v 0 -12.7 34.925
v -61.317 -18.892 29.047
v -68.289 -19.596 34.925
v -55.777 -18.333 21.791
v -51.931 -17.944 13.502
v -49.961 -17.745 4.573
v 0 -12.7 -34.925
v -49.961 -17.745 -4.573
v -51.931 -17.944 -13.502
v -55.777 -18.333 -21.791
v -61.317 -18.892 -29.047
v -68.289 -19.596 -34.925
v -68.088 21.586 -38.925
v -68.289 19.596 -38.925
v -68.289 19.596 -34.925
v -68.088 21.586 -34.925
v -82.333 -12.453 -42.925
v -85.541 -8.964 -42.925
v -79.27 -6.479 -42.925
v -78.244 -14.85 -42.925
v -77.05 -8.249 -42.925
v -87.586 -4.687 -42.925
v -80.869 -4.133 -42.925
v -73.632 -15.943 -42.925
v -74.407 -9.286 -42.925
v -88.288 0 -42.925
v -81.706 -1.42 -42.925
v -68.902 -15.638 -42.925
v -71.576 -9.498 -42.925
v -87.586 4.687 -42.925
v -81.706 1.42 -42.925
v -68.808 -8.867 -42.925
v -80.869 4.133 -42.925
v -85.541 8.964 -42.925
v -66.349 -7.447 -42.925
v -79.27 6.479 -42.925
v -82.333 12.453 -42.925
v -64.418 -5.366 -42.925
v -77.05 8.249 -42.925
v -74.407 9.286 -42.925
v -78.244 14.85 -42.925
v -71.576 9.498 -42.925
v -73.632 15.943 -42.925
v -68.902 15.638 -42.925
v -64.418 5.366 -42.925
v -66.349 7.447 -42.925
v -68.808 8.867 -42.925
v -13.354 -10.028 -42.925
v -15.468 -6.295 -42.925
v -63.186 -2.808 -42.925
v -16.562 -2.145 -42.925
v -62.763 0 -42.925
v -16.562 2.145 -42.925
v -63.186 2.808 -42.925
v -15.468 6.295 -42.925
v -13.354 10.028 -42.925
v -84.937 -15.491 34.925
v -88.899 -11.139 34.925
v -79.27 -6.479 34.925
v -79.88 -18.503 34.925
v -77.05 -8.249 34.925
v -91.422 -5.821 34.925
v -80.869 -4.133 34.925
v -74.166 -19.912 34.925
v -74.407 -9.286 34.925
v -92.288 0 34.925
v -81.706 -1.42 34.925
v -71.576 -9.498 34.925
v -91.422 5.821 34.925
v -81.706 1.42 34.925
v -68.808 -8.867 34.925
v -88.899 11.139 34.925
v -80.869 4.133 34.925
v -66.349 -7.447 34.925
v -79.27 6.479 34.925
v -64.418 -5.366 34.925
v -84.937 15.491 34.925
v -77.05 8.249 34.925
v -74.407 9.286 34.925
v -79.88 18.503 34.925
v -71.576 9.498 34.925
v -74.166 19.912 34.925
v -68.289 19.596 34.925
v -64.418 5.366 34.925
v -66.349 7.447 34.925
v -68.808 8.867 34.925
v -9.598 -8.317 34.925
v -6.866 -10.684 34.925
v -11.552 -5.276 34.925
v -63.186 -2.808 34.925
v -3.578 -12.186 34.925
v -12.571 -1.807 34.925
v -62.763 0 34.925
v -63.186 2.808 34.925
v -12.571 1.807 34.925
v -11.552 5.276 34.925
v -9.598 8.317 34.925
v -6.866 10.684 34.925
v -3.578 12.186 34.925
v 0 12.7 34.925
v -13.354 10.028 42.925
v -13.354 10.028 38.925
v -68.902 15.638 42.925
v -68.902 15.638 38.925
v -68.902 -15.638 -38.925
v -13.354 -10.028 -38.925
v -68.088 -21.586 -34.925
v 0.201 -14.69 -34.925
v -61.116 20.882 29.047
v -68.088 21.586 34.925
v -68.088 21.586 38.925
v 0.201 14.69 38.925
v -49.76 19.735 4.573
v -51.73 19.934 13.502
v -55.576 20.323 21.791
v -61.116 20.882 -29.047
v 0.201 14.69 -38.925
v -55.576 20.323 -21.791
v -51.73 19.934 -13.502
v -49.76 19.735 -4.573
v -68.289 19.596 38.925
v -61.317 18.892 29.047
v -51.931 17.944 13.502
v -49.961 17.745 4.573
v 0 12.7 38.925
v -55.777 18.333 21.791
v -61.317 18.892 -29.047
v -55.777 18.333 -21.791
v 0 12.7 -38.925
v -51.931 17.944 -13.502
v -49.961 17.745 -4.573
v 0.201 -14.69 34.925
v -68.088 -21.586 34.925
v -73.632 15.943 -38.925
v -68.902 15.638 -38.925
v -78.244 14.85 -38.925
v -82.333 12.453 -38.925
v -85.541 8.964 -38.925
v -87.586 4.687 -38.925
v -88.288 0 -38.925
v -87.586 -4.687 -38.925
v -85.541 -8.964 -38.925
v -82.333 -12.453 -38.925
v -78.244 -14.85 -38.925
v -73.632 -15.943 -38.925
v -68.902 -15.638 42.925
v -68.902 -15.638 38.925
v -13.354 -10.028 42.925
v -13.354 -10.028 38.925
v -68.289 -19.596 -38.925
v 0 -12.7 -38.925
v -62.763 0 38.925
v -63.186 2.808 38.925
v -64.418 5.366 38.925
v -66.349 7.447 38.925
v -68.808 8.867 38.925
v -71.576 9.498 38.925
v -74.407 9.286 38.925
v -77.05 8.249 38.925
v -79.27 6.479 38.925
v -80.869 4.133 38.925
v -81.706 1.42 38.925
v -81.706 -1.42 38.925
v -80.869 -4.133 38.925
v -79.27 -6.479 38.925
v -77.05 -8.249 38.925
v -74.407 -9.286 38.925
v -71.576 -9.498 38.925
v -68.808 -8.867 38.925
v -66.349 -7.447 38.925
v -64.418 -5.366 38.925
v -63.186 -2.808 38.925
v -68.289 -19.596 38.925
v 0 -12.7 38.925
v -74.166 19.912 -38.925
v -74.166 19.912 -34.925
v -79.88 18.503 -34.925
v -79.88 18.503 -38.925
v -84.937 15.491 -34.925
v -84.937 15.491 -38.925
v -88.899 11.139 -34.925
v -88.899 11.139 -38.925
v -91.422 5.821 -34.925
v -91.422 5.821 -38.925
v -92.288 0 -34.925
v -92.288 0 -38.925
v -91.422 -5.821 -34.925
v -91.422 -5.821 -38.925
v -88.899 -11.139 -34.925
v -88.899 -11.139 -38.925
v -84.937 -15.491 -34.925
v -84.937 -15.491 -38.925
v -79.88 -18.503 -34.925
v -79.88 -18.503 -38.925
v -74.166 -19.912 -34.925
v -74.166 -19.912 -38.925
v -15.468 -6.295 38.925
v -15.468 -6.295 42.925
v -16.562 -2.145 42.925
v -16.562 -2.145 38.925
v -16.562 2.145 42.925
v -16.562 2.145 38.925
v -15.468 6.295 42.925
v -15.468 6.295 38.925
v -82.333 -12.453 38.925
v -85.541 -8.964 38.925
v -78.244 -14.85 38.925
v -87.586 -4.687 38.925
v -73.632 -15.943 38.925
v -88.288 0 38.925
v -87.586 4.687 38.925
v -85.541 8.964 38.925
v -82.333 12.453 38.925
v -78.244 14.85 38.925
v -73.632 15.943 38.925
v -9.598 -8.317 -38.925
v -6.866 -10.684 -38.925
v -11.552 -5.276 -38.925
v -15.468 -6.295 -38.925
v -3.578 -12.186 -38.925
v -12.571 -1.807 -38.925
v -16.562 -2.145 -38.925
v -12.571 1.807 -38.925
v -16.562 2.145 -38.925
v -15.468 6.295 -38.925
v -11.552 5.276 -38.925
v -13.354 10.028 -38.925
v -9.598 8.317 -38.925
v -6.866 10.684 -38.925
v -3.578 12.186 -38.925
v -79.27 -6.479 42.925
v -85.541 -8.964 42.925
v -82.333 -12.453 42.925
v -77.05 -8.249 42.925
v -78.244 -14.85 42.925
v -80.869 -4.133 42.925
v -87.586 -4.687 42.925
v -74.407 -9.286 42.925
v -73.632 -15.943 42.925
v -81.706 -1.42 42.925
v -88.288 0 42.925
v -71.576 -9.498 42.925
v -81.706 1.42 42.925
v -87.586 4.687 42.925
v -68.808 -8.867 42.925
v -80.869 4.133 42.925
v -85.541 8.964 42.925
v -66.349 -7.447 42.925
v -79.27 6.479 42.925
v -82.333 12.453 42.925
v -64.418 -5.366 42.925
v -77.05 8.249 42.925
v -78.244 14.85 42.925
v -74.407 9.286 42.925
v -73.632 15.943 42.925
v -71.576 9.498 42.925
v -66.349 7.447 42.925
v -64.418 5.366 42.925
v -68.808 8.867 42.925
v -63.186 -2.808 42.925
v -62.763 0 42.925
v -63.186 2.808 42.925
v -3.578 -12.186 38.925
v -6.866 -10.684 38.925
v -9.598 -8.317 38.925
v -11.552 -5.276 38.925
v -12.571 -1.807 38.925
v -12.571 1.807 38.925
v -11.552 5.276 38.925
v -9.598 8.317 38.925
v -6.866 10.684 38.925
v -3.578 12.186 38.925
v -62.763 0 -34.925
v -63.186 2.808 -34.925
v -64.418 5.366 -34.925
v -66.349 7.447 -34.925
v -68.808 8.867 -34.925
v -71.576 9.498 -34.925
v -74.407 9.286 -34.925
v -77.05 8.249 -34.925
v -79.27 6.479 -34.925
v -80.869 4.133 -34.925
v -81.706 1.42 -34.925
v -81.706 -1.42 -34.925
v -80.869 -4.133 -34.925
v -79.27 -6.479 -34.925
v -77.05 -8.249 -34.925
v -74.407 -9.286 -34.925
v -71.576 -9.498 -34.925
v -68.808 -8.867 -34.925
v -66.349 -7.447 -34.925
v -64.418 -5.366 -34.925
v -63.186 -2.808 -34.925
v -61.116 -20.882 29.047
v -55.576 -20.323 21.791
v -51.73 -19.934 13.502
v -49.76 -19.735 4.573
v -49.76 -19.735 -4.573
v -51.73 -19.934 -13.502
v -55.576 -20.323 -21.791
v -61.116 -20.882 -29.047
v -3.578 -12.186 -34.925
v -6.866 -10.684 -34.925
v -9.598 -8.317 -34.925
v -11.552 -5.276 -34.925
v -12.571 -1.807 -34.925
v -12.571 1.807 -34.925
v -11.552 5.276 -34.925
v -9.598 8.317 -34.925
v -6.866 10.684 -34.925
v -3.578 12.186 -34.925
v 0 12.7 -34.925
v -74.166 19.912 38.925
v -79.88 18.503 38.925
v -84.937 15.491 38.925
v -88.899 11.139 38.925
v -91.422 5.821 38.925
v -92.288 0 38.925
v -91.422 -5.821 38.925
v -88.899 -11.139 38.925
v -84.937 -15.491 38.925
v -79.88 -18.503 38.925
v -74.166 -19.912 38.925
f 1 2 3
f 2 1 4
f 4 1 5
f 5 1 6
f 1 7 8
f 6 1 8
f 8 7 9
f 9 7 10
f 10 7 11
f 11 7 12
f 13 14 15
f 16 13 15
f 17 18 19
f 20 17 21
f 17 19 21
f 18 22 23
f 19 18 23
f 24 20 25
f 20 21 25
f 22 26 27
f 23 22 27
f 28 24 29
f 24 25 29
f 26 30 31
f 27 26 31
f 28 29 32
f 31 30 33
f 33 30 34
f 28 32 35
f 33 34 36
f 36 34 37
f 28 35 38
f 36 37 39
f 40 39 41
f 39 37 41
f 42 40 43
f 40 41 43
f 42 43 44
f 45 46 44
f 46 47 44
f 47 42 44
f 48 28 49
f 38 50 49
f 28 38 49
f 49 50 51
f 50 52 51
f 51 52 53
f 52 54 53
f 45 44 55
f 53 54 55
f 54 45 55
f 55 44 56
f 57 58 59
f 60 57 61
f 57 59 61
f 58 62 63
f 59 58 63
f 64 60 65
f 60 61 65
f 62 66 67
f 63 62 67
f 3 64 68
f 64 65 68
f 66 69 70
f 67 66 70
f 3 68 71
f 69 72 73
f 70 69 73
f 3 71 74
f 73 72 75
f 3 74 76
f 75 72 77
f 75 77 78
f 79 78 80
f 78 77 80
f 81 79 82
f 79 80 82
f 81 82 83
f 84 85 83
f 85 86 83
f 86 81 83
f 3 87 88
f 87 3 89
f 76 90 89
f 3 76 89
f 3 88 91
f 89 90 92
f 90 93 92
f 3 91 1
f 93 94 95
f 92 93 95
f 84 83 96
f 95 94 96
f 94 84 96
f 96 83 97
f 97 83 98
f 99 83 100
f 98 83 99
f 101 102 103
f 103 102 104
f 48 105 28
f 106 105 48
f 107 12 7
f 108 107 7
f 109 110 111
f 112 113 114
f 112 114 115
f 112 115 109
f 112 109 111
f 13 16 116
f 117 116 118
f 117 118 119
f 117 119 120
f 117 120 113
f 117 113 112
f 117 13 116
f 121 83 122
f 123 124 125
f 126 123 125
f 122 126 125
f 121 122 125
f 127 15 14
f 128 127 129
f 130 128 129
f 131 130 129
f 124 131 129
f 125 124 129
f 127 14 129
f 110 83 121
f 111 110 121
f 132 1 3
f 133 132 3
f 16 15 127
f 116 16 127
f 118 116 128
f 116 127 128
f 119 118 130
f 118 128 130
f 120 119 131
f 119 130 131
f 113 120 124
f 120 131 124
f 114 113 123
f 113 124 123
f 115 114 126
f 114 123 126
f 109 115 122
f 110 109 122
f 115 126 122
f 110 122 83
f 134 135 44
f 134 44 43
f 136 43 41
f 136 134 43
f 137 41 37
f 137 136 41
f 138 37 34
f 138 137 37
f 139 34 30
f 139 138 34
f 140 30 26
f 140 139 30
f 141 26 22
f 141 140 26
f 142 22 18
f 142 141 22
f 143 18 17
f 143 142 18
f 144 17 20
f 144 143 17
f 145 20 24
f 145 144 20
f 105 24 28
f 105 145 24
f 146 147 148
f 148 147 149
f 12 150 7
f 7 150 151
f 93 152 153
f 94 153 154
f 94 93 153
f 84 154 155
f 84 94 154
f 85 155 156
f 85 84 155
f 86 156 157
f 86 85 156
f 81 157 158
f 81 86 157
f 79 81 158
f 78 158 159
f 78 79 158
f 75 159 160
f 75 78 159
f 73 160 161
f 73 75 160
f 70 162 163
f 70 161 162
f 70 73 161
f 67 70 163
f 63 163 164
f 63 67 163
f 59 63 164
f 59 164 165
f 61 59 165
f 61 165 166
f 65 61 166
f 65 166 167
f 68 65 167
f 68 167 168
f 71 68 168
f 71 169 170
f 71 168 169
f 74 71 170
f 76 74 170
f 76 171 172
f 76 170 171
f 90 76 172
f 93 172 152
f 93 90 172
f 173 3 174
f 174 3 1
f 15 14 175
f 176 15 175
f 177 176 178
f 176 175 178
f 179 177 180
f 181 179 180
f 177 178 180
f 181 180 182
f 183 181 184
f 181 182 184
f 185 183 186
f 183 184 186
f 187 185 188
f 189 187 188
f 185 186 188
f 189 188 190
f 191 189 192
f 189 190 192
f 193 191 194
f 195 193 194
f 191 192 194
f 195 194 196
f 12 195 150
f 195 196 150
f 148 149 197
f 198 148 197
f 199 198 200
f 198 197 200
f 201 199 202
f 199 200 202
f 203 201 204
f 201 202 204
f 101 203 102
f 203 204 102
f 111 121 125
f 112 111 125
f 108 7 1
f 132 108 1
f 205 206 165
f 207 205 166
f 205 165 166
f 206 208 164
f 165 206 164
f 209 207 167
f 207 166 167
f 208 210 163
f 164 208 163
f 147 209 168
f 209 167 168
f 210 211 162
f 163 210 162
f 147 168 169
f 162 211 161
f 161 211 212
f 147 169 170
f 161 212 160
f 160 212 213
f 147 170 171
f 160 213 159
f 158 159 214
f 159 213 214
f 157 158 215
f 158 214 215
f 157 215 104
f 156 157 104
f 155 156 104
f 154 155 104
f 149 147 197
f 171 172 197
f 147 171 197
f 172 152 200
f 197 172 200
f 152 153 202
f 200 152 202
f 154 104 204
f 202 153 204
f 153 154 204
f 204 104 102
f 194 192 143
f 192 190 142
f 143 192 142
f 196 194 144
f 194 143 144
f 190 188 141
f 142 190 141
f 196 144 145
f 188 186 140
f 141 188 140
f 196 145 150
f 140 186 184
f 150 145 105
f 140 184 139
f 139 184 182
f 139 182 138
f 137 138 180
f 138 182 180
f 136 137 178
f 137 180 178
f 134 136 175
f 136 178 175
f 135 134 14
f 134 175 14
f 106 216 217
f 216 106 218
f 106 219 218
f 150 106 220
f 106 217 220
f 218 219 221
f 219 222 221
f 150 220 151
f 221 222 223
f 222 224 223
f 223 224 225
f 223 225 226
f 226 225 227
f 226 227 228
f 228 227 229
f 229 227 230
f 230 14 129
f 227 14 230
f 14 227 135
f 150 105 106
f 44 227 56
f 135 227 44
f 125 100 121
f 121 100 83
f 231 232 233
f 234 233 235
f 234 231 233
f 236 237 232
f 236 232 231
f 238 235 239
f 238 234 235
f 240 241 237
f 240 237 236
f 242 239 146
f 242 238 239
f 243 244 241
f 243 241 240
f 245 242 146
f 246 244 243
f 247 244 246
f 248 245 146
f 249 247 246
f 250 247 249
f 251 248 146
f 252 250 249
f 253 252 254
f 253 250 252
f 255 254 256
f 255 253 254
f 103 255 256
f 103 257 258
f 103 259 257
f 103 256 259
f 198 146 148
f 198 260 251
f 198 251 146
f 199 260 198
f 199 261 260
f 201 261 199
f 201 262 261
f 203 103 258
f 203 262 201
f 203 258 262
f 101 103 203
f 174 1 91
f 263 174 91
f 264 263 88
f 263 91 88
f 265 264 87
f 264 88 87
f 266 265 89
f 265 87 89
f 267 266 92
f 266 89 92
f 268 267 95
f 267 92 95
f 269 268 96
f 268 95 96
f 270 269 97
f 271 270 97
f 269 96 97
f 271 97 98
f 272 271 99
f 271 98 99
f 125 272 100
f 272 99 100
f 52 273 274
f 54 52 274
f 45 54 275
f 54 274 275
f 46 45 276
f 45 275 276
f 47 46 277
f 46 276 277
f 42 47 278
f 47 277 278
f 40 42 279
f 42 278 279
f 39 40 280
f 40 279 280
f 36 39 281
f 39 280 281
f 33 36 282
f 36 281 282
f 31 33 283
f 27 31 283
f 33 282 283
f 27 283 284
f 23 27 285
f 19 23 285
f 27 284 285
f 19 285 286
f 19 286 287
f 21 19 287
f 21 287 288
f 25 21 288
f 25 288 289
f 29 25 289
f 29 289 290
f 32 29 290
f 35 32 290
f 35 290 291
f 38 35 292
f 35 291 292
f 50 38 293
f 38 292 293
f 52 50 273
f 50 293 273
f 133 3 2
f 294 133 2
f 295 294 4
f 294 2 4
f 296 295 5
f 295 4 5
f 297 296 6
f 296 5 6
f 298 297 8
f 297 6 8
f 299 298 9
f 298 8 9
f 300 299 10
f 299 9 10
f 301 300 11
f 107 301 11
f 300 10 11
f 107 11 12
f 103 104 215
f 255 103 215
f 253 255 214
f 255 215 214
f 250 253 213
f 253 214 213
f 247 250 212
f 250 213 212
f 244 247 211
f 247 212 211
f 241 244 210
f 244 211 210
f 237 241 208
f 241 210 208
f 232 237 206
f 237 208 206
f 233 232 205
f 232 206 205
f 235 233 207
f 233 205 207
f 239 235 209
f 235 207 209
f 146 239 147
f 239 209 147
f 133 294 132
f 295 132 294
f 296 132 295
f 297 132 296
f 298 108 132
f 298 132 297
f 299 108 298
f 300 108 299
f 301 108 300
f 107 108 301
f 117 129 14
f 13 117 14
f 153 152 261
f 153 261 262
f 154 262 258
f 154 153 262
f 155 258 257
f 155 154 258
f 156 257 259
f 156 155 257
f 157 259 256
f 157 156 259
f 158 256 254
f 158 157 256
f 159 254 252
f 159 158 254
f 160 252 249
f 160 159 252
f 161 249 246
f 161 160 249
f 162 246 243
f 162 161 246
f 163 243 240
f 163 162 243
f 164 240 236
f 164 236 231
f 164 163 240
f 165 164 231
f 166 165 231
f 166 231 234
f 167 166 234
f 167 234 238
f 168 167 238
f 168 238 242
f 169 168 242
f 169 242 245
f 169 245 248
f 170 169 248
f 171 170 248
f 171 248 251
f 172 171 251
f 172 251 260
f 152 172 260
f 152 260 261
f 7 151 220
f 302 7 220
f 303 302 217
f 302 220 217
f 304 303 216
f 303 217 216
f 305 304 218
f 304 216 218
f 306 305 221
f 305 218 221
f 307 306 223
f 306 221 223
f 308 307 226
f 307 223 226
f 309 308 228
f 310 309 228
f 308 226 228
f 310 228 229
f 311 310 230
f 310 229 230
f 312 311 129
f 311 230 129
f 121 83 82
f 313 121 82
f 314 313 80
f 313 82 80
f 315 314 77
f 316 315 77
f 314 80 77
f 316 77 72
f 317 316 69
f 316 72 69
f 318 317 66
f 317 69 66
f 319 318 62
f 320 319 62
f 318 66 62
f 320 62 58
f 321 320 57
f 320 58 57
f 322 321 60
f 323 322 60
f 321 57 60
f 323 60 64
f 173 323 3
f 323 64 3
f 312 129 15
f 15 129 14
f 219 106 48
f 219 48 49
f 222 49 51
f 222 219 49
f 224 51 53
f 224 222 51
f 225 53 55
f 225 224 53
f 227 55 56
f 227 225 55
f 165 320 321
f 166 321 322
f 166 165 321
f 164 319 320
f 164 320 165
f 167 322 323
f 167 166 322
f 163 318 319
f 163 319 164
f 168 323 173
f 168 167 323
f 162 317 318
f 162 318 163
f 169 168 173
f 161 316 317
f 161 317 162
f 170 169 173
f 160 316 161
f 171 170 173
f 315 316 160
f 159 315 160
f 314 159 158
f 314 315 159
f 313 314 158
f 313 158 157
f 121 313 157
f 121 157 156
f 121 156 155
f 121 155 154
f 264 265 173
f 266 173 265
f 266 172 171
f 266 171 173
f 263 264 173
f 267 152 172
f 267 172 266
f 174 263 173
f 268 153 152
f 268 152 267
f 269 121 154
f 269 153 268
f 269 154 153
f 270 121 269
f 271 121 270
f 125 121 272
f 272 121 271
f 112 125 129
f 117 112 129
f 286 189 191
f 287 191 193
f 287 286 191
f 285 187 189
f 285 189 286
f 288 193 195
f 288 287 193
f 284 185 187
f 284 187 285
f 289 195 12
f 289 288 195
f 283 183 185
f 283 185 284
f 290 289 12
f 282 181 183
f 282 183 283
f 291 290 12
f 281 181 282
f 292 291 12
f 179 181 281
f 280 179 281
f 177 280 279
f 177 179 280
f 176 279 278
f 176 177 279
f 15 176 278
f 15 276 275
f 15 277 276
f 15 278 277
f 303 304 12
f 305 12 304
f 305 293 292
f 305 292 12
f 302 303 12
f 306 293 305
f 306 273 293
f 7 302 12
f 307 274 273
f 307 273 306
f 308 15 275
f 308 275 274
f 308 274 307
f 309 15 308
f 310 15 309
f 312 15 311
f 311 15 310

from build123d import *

# Parameters (mm, degrees)
BOSS_EXTRUDE1_DEPTH = 4
BOSS_EXTRUDE2_START = -4
BOSS_EXTRUDE2_DEPTH = 4
BOSS_EXTRUDE3_DEPTH = 4
CUT_EXTRUDE1_START  = -8
SKETCH6_R           = 9.525
CUT_EXTRUDE1_DEPTH  = 8
BOSS_EXTRUDE4_DEPTH = 2
BOSS_EXTRUDE5_DEPTH = 2


with BuildPart() as part:
    # Sketch1 → Boss-Extrude1 (new body)
    with BuildSketch(Plane.XY.offset(34.925)):
        with BuildLine():
            Line((0, 12.7), (-68.288930824, 19.596194833))
            ThreePointArc((-68.288930824, 19.596194833), (-92.287574102, 0), (-68.288930824, -19.596194833))
            Line((-68.288930824, -19.596194833), (0, -12.7))
            ThreePointArc((0, -12.7), (-12.7, 0), (0, 12.7))
        make_face()
    extrude(amount=BOSS_EXTRUDE1_DEPTH)


with BuildPart() as body_2:
    # Sketch2 → Boss-Extrude2 (new body)
    with BuildSketch(Plane.XY.offset(-34.925).offset(BOSS_EXTRUDE2_START)):
        with BuildLine():
            Line((-68.288930824, -19.596194833), (0, -12.7))
            ThreePointArc((0, -12.7), (-12.7, 0), (0, 12.7))
            Line((0, 12.7), (-68.288930824, 19.596194833))
            ThreePointArc((-68.288930824, 19.596194833), (-92.287574102, 0), (-68.288930824, -19.596194833))
        make_face()
    extrude(amount=BOSS_EXTRUDE2_DEPTH)


with BuildPart() as body_3:
    # Sketch5 → Boss-Extrude3 (new body)
    with BuildSketch(Plane.XY.offset(38.925)):
        with BuildLine():
            Line((-13.353845377, 10.028200918), (-68.902470005, 15.637808998))
            ThreePointArc((-68.902470005, 15.637808998), (-88.287574102, 0), (-68.902470005, -15.637808998))
            Line((-68.902470005, -15.637808998), (-13.353845377, -10.028200918))
            ThreePointArc((-13.353845377, -10.028200918), (-16.7, 0), (-13.353845377, 10.028200918))
        make_face()
    boss_extrude3 = extrude(amount=BOSS_EXTRUDE3_DEPTH)


with BuildPart() as cut_extrude1_tool:
    # Sketch6 → Cut-Extrude1 (new body)
    with BuildSketch(Plane.XY.offset(42.925).offset(CUT_EXTRUDE1_START)):
        with Locations((-72.287574102, 0)):
            Circle(SKETCH6_R)
    cut_extrude1 = extrude(amount=CUT_EXTRUDE1_DEPTH)


with BuildPart() as part_1:
    add(part.part)

    # Cut-Extrude1: cut by cut_extrude1_tool
    add(cut_extrude1_tool.part, mode=Mode.SUBTRACT)


with BuildPart() as body_3_1:
    add(body_3.part)

    # Cut-Extrude1: cut by cut_extrude1_tool
    add(cut_extrude1_tool.part, mode=Mode.SUBTRACT)


with BuildPart() as body_2_1:
    add(body_2.part)

    # Mirror1: Boss-Extrude3, Cut-Extrude1 across plane
    add(boss_extrude3.mirror(Plane.XY))
    add(cut_extrude1.mirror(Plane.XY), mode=Mode.SUBTRACT)


with BuildPart() as body_4:
    # Sketch7 → Boss-Extrude4 (new body)
    with BuildSketch(Plane(origin=(1.269569241, 12.571791859, 0), x_dir=(0.9949396317493256, -0.10047452002630568, 0), z_dir=(0.10047452002630568, 0.9949396317493256, 0))):
        with BuildLine():
            Line((-1.276026404, -38.925), (-1.276026404, 38.925))
            Line((-1.276026404, 38.925), (-69.912281957, 38.925))
            Line((-69.912281957, 38.925), (-69.912281957, 34.925))
            ThreePointArc((-69.912281957, 34.925), (-51.241327694, 0), (-69.912281957, -34.925))
            Line((-69.912281957, -34.925), (-69.912281957, -38.925))
            Line((-69.912281957, -38.925), (-1.276026404, -38.925))
        make_face()
    extrude(amount=BOSS_EXTRUDE4_DEPTH)


with BuildPart() as body_5:
    # Sketch8 → Boss-Extrude5 (new body)
    with BuildSketch(Plane(origin=(1.269569241, -12.571791859, 0), x_dir=(-0.9949396317493256, -0.10047452002630568, 0), z_dir=(0.10047452002630568, -0.9949396317493256, 0))):
        with BuildLine():
            Line((69.912281957, 34.925), (1.276026404, 34.925))
            Line((1.276026404, 34.925), (1.276026404, -34.925))
            Line((1.276026404, -34.925), (69.912281957, -34.925))
            ThreePointArc((69.912281957, -34.925), (51.241327694, 0), (69.912281957, 34.925))
        make_face()
    extrude(amount=BOSS_EXTRUDE5_DEPTH)


solid = Compound([part_1.part, body_3_1.part, body_2_1.part, body_4.part, body_5.part])
